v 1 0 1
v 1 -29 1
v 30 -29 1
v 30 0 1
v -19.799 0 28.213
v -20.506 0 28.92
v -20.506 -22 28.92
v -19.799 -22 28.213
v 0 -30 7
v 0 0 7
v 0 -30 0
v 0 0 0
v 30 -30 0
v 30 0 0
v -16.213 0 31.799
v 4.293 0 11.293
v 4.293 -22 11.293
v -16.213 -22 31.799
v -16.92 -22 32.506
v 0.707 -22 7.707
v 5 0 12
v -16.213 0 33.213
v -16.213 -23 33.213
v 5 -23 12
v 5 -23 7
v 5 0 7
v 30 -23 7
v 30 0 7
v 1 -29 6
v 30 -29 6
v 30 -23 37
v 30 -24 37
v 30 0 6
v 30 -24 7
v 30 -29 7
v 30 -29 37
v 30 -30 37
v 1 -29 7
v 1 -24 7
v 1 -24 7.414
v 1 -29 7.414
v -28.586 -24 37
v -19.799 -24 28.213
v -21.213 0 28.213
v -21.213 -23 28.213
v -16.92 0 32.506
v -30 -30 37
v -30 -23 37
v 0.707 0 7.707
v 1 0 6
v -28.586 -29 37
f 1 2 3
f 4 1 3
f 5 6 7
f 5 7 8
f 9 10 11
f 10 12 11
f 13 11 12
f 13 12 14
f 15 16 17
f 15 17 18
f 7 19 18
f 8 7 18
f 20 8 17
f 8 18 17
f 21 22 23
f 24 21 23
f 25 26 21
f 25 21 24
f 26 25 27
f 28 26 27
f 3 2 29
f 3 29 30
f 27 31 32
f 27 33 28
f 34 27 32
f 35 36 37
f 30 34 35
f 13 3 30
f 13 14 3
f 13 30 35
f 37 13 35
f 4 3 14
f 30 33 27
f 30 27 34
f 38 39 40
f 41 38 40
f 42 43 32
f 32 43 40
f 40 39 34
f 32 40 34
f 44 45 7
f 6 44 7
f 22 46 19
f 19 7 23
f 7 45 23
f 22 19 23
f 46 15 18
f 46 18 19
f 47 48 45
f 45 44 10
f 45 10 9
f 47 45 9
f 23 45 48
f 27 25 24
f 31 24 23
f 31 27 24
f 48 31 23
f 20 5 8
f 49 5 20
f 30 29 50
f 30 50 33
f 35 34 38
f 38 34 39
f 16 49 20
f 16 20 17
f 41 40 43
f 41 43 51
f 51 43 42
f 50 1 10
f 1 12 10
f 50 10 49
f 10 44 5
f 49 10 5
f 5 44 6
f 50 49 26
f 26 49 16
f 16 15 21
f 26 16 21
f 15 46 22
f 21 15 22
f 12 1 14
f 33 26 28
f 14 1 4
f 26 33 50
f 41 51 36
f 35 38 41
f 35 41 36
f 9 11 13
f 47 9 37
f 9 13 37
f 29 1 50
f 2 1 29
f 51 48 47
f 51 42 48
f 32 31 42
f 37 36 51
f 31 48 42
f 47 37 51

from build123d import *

# Parameters (mm, degrees)
SKETCH1_W           = 30
SKETCH1_H           = 30
BOSS_EXTRUDE1_DEPTH = 7
SHELL1_T            = -1
SKETCH2_W           = 30
SKETCH2_H           = 7
BOSS_EXTRUDE2_DEPTH = 30
SKETCH3_W           = 30
SKETCH3_H           = 7
BOSS_EXTRUDE3_DEPTH = 30
SKETCH5_W           = 5
SKETCH5_H           = 23
BOSS_EXTRUDE4_DEPTH = 5
CUT_EXTRUDE6_DEPTH  = 23
SKETCH12_W          = 7.071067812
SKETCH12_H          = 23
BOSS_EXTRUDE6_DEPTH = 30
CUT_EXTRUDE7_DEPTH  = 22
CUT_EXTRUDE8_DEPTH  = 22
SHELL2_START        = 24
SHELL2_DEPTH        = 5
SHELL2_START_2      = 23
SHELL2_2_DEPTH      = 1
SHELL2_START_3      = 1
SHELL2_3_DEPTH      = 22
BOSS_EXTRUDE7_DEPTH = 1
BOSS_EXTRUDE8_DEPTH = 23
CUT_EXTRUDE10_DEPTH = 1
CUT_EXTRUDE12_START = -30
CUT_EXTRUDE12_DEPTH = 50


# Read off the part's stored shape, not the designer's step: Shell2
with BuildPart() as part:
    # Sketch1 → Boss-Extrude1 (new body)
    with BuildSketch(Plane.XY):
        with Locations((15, 15)):
            Rectangle(SKETCH1_W, SKETCH1_H)
    extrude(amount=BOSS_EXTRUDE1_DEPTH)

    # Shell1
    shell1_openings = [part.faces().sort_by_distance(p)[0] for p in [
        (30, 15, 3.5),
        (15, 0, 3.5),
    ]]
    offset(amount=SHELL1_T, openings=shell1_openings, kind=Kind.INTERSECTION)

    # Sketch2 → Boss-Extrude2 (add)
    with BuildSketch(Plane.XY.offset(7)):
        with Locations((15, 26.5)):
            Rectangle(SKETCH2_W, SKETCH2_H)
    extrude(amount=BOSS_EXTRUDE2_DEPTH)

    # Sketch3 → Boss-Extrude3 (add)
    with BuildSketch(Plane.ZY):
        with Locations((22, 26.5)):
            Rectangle(SKETCH3_W, SKETCH3_H)
    extrude(amount=BOSS_EXTRUDE3_DEPTH)

    # Sketch5 → Boss-Extrude4 (add)
    with BuildSketch(Plane.XY.offset(7)):
        with Locations((2.5, 11.5)):
            Rectangle(SKETCH5_W, SKETCH5_H)
    extrude(amount=BOSS_EXTRUDE4_DEPTH)

    # Sketch6 → Cut-Extrude6 (cut)
    with BuildSketch(Plane.XZ):
        Polygon((0, 12), (5, 12), (0, 7), align=None)
    extrude(amount=-CUT_EXTRUDE6_DEPTH, mode=Mode.SUBTRACT)

    # Sketch12 → Boss-Extrude6 (add)
    with BuildSketch(Plane(origin=(-3.5, 0, 3.5), x_dir=(0.7071067811865475, 0, 0.7071067811865477), z_dir=(-0.7071067811865477, 0, 0.7071067811865475))):
        with Locations((8.485281374, 11.5)):
            Rectangle(SKETCH12_W, SKETCH12_H)
    extrude(amount=BOSS_EXTRUDE6_DEPTH)

    # Sketch13 → Cut-Extrude7 (cut)
    with BuildSketch(Plane.XZ):
        Polygon((-19.798989873, 28.213203436), (0.707106781, 7.707106781), (4.292893219, 11.292893219), (-16.213203436, 31.798989873), (-16.920310217, 32.506096654), (-20.506096654, 28.920310217), align=None)
    extrude(amount=-CUT_EXTRUDE7_DEPTH, mode=Mode.SUBTRACT)

    # Sketch4 → Cut-Extrude8 (cut)
    with BuildSketch(Plane.XZ.offset(-23)):
        Polygon((-30, 37), (0, 7), (-30, 7), align=None)
    extrude(amount=-CUT_EXTRUDE8_DEPTH, mode=Mode.SUBTRACT)

    # Shell2 outline → Shell2 (cut)
    with BuildSketch(Plane(origin=(0, 0, 0), x_dir=(1, 0, 0), z_dir=(0, 1, 0)).offset(SHELL2_START)):
        Polygon((29, -37), (29, -7), (1, -7), (1, -7.414213562), (-28.585786438, -37), align=None)
    extrude(amount=SHELL2_DEPTH, mode=Mode.SUBTRACT)

    # Shell2 2 outline → Shell2 2 (cut)
    with BuildSketch(Plane(origin=(0, 0, 0), x_dir=(1, 0, 0), z_dir=(0, 1, 0)).offset(SHELL2_START_2)):
        Polygon((4, -7), (1, -7), (1, -7.414213562), (-19.798989873, -28.213203435), (-16.213203436, -31.798989873), (4, -11.585786438), align=None)
    extrude(amount=SHELL2_2_DEPTH, mode=Mode.SUBTRACT)

    # Shell2 3 outline → Shell2 3 (cut)
    with BuildSketch(Plane(origin=(0, 0, 0), x_dir=(1, 0, 0), z_dir=(0, 1, 0)).offset(SHELL2_START_3)):
        Polygon((4, -9.585786438), (4, -7), (1.414213562, -7), align=None)
    extrude(amount=SHELL2_3_DEPTH, mode=Mode.SUBTRACT)

    # Sketch16 → Boss-Extrude7 (add)
    with BuildSketch(Plane(origin=(0, 23, 0), x_dir=(1, 0, 0), z_dir=(0, 1, 0))):
        Polygon((1.414213562, -7), (1, -7), (1, -7.414213562), (-19.798989873, -28.213203436), (-16.213203436, -31.798989873), (4, -11.585786438), (4, -9.585786438), align=None)
    extrude(amount=BOSS_EXTRUDE7_DEPTH)

    # Sketch18 → Boss-Extrude8 (add)
    with BuildSketch(Plane(origin=(0, 1, 0), x_dir=(1, 0, 0), z_dir=(0, 1, 0))):
        Polygon((4, -9.585786438), (4, -7), (1.414213562, -7), align=None)
    extrude(amount=BOSS_EXTRUDE8_DEPTH)

    # Sketch19 → Cut-Extrude10 (cut)
    with BuildSketch(Plane(origin=(30, 0, 0), x_dir=(0, 0, -1), z_dir=(1, 0, 0))):
        Polygon((-36, 29), (-37, 29), (-37, 24), (-36, 24), (-7, 24), (-7, 29), align=None)
    extrude(amount=-CUT_EXTRUDE10_DEPTH, mode=Mode.SUBTRACT)

    # Mirror4: part across plane


with BuildPart() as part_1:
    add(part.part)
    add(part.part.mirror(Plane(origin=(0, 0, 7), x_dir=(0, 0, 1), z_dir=(0, 1, 0))))

    # Sketch20 → Cut-Extrude12 (cut)
    with BuildSketch(Plane.XZ.offset(30).offset(CUT_EXTRUDE12_START)):
        Polygon((0, 7), (0, 0), (30, 0), (30, 37), (-30, 37), align=None)
    extrude(amount=-CUT_EXTRUDE12_DEPTH, mode=Mode.SUBTRACT)


solid = part_1.part
